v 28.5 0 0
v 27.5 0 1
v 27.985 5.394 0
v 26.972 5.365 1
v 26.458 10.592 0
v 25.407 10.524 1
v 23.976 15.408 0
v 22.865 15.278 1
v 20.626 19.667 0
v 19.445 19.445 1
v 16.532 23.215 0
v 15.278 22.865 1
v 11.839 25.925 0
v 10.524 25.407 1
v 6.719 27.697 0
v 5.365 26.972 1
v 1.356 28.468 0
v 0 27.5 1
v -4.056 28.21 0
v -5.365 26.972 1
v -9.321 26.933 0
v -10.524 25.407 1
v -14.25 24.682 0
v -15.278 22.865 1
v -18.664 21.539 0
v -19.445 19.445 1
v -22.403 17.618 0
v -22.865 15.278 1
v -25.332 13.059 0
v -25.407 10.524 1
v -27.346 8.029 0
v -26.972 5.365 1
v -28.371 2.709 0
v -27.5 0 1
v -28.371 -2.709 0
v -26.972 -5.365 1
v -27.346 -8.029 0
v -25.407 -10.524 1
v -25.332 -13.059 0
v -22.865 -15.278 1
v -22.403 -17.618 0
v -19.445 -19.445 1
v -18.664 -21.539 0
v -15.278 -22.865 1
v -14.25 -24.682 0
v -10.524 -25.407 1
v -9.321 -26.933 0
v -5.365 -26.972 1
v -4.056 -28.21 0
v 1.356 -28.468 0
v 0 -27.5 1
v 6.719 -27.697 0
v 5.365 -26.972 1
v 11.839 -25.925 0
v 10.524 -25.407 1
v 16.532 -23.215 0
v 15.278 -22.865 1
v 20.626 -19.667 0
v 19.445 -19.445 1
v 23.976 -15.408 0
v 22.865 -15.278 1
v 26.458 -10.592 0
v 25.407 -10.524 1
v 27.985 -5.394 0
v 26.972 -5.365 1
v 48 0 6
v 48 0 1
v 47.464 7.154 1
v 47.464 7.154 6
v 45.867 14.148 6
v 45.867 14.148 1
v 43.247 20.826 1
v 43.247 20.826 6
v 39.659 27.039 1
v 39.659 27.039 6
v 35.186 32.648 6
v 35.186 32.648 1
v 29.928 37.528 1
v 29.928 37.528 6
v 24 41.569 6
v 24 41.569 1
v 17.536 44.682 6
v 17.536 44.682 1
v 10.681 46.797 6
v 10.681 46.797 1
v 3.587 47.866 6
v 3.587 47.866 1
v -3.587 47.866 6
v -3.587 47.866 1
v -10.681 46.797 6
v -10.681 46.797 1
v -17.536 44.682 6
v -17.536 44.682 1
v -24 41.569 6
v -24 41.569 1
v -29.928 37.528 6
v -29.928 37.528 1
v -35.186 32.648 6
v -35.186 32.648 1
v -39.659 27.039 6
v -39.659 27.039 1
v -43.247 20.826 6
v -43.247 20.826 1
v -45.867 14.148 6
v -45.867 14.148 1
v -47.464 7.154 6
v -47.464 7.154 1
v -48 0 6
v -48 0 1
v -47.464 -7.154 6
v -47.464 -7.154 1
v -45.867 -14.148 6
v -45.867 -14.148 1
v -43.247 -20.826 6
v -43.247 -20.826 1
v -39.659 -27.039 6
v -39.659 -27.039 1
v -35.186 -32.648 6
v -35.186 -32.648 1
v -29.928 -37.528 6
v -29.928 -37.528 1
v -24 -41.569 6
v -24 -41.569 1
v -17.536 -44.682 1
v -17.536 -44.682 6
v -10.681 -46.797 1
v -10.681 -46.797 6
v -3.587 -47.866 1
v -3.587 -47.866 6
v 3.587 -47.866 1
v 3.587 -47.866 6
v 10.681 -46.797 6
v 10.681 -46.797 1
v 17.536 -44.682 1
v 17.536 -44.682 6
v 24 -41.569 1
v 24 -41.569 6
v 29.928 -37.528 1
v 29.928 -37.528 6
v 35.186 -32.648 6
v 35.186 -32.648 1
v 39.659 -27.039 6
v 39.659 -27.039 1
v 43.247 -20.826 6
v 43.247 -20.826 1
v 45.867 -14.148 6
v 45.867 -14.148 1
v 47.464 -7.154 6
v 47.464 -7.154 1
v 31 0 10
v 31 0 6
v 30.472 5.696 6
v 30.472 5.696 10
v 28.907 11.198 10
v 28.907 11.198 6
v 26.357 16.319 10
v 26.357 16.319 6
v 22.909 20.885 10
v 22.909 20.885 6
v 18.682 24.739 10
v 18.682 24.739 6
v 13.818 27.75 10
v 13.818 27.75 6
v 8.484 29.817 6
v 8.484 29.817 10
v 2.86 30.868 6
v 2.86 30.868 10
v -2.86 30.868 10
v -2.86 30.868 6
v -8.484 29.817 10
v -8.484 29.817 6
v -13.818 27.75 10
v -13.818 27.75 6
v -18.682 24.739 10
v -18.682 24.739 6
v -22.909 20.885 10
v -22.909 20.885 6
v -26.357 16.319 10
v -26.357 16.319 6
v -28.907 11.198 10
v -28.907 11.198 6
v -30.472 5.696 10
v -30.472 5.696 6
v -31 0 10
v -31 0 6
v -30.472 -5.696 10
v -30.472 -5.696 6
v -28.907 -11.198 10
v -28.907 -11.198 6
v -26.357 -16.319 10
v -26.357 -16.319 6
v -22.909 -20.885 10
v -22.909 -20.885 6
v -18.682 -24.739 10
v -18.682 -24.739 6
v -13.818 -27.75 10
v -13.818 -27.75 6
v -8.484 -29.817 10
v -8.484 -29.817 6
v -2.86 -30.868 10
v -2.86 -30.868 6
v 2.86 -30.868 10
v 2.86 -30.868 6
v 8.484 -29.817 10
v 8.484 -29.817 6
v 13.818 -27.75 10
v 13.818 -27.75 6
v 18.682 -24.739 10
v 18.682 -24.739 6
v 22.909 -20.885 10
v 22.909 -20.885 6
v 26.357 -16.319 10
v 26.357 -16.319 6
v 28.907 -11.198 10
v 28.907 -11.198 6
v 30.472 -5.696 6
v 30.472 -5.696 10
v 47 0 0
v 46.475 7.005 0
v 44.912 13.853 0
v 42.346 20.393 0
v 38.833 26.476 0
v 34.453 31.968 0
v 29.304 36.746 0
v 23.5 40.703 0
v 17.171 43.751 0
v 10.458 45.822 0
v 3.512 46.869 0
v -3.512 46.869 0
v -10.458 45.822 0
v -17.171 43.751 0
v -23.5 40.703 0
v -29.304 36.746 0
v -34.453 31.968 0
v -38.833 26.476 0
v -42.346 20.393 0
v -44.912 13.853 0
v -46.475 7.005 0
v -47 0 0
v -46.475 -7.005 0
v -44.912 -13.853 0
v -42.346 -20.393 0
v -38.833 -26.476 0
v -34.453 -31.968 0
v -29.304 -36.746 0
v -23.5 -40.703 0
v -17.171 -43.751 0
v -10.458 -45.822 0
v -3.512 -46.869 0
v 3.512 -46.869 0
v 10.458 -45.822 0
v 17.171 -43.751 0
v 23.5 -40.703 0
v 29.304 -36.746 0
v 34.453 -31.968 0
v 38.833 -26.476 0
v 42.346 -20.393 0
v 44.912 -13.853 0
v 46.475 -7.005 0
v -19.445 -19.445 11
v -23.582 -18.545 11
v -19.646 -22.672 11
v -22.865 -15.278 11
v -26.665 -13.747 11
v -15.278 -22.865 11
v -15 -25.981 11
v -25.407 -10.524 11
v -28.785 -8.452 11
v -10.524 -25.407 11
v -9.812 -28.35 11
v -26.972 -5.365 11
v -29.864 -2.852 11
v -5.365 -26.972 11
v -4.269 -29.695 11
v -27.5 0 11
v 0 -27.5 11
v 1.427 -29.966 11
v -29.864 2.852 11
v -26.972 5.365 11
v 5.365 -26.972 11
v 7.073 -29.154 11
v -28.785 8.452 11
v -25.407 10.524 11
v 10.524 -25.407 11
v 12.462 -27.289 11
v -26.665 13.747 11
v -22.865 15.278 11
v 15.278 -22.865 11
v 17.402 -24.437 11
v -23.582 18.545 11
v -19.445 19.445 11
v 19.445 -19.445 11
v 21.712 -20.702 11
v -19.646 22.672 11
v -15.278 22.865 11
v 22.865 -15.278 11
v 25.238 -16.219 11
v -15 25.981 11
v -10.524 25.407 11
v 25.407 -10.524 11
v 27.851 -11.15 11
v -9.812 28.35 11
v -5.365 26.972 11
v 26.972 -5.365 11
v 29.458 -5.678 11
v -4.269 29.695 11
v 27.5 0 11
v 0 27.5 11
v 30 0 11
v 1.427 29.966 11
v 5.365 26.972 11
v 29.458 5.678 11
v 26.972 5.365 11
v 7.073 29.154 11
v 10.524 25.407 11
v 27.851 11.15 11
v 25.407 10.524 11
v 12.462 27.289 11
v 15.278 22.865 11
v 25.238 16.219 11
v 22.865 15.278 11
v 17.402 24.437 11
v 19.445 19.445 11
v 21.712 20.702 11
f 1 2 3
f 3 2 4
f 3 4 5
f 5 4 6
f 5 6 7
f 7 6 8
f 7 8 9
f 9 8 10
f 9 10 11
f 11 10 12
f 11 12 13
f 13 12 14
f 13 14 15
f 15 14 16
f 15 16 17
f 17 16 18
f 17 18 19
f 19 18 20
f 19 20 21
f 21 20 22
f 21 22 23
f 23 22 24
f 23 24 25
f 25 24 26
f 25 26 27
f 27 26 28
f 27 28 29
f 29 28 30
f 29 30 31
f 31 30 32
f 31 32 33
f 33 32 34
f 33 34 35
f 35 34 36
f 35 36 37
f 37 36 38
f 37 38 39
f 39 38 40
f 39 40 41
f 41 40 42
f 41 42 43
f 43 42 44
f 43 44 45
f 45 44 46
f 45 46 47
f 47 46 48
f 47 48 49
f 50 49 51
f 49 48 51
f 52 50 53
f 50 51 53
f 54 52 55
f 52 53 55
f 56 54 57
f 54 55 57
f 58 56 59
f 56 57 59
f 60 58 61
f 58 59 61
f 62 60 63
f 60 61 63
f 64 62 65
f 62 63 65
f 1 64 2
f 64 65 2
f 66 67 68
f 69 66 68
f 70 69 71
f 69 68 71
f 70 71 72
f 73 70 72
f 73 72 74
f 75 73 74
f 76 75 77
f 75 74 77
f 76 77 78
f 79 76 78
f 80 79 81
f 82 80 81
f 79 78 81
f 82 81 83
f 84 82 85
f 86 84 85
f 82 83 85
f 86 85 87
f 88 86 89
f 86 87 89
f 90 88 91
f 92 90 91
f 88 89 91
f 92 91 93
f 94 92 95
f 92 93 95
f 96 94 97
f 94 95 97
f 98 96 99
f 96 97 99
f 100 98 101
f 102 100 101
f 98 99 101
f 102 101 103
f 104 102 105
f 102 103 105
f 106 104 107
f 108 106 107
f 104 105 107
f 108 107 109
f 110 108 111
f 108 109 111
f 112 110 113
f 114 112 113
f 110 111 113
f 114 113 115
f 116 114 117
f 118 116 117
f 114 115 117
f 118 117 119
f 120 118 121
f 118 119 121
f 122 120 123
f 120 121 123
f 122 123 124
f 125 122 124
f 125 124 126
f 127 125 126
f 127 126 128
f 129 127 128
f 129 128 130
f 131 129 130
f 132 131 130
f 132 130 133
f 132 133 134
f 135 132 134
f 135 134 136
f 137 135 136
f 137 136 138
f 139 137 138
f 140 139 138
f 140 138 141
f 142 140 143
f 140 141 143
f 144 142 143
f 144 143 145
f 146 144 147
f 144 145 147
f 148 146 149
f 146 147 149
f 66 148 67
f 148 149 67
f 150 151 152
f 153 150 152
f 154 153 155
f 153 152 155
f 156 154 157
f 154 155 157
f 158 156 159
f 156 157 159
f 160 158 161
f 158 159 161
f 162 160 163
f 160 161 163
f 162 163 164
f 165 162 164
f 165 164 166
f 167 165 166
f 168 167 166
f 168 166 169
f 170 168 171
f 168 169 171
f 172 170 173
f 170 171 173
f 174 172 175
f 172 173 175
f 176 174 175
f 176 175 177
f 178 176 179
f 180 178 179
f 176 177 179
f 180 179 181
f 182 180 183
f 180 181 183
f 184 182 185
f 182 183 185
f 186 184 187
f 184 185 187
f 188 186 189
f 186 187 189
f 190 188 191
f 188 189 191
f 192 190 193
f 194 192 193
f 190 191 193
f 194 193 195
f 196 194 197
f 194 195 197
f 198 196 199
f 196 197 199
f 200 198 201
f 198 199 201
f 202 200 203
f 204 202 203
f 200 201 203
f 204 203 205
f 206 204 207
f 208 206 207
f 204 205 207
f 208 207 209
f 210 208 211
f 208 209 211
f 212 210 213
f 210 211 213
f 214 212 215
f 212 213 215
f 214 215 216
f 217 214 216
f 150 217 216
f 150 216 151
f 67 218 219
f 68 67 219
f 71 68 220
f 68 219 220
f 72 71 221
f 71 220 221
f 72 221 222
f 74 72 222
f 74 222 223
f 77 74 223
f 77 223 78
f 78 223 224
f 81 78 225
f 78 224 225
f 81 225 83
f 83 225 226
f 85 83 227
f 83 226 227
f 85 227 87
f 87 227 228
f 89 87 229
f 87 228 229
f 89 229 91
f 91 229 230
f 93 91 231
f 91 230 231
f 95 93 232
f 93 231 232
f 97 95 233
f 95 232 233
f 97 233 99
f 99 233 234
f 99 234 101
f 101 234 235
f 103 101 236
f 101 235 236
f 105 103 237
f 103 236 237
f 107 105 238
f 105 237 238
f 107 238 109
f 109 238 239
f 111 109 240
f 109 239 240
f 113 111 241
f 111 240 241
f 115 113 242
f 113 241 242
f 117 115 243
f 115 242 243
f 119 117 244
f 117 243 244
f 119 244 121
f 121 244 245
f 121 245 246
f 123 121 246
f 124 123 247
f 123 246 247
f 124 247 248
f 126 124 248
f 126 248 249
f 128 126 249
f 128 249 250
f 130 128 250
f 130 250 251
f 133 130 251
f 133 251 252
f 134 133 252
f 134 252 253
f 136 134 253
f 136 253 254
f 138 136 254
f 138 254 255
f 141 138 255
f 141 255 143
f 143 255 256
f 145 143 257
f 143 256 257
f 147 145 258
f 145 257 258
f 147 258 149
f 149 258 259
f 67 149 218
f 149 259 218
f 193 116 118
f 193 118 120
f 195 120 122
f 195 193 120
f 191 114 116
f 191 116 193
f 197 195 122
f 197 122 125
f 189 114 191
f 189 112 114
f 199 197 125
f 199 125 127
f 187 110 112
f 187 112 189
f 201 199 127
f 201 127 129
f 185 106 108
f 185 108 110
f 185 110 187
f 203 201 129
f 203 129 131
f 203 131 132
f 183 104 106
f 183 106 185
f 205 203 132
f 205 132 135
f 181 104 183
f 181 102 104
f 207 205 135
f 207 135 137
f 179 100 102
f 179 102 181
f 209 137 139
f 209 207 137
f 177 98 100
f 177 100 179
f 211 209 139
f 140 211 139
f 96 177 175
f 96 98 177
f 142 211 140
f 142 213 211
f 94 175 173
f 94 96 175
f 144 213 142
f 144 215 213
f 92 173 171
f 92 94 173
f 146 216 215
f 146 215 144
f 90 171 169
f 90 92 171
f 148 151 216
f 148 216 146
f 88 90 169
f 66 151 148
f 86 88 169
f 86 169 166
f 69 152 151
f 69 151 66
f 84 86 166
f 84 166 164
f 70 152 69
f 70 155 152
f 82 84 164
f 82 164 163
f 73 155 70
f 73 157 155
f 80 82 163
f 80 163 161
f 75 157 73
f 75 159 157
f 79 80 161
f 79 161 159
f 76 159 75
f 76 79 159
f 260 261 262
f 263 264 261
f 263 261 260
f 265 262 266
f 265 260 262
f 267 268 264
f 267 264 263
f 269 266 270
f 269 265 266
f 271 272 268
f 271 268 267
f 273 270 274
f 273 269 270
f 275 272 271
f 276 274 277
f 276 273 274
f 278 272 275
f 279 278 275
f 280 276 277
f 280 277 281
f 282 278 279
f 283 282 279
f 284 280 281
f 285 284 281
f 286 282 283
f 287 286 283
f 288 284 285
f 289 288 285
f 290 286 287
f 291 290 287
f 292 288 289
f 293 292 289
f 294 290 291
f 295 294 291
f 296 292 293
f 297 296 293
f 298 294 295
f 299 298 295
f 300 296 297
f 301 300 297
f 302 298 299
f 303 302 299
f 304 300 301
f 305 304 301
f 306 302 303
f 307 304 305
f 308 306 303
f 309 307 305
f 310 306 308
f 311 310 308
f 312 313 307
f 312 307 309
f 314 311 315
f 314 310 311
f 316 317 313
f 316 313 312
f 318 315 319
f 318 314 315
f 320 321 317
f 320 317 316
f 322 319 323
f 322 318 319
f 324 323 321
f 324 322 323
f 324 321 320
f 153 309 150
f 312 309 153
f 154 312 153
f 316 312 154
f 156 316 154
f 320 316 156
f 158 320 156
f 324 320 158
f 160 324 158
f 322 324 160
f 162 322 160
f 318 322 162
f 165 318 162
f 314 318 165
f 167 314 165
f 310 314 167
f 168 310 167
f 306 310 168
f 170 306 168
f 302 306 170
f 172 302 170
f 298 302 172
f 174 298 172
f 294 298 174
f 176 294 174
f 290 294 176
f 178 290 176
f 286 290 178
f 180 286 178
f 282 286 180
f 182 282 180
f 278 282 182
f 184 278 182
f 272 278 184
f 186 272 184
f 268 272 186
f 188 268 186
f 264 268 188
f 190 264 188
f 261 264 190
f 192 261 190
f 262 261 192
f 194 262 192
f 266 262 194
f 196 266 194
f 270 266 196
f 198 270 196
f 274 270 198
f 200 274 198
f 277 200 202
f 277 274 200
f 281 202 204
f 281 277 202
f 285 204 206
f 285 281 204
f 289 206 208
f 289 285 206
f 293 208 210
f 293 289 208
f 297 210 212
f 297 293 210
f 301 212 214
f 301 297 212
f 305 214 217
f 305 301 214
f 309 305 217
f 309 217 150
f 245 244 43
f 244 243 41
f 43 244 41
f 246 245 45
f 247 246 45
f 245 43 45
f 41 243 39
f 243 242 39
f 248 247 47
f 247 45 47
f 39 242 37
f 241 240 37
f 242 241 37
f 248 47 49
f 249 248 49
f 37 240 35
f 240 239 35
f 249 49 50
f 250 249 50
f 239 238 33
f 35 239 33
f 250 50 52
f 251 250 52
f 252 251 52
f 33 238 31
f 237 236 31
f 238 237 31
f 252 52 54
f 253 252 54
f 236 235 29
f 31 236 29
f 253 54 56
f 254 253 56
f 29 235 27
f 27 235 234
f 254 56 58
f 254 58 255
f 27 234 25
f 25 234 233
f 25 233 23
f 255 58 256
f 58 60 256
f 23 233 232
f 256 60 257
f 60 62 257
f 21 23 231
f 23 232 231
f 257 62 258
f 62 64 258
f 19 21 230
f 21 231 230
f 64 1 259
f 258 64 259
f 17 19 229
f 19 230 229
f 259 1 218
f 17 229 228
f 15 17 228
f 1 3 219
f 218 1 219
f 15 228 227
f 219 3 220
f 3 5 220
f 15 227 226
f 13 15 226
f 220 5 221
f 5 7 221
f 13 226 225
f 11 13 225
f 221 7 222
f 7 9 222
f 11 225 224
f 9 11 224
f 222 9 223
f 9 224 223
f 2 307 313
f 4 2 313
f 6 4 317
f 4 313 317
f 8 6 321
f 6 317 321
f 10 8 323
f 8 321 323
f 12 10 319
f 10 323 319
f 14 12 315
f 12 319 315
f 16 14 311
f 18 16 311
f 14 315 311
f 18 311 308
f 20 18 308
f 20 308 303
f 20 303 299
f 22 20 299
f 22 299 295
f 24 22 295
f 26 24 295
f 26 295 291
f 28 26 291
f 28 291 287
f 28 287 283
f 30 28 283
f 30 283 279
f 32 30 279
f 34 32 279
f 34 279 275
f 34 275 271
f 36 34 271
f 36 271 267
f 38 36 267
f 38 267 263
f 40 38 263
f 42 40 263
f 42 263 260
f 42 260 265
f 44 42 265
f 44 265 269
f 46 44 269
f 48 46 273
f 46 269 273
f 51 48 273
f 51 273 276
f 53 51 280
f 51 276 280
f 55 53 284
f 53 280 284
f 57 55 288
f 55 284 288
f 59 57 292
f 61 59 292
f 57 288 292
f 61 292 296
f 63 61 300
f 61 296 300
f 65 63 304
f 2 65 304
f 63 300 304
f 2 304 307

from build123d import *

# Parameters (mm, degrees)
SCHIZZO1_R        = 48
ESTRUSIONE1_DEPTH = 6
SCHIZZO2_R        = 31
ESTRUSIONE2_DEPTH = 5
SMUSSO1_SIZE      = 1
SCHIZZO3_R        = 27.5
ESTRUSIONE3_DEPTH = 69.767724988
SMUSSO2_SIZE      = 1


with BuildPart() as part:
    # Schizzo1 → Estrusione1 (new body)
    with BuildSketch(Plane.XY):
        Circle(SCHIZZO1_R)
    extrude(amount=ESTRUSIONE1_DEPTH)

    # Schizzo2 → Estrusione2 (add)
    with BuildSketch(Plane.XY.offset(6)):
        Circle(SCHIZZO2_R)
    extrude(amount=ESTRUSIONE2_DEPTH)

    # Smusso1
    smusso1_edges = [part.edges().sort_by_distance(p)[0] for p in [
        (-48, 0, 0),
        (-31, 0, 11),
    ]]
    chamfer(smusso1_edges, length=SMUSSO1_SIZE)

    # Schizzo3 → Estrusione3 (cut, through all)
    with BuildSketch(Plane.XY.offset(11)):
        Circle(SCHIZZO3_R)
    extrude(amount=-ESTRUSIONE3_DEPTH, mode=Mode.SUBTRACT)

    # Smusso2
    smusso2_edges = [part.edges().sort_by_distance(p)[0] for p in [
        (-27.5, 0, 0),
    ]]
    chamfer(smusso2_edges, length=SMUSSO2_SIZE)


solid = part.part
